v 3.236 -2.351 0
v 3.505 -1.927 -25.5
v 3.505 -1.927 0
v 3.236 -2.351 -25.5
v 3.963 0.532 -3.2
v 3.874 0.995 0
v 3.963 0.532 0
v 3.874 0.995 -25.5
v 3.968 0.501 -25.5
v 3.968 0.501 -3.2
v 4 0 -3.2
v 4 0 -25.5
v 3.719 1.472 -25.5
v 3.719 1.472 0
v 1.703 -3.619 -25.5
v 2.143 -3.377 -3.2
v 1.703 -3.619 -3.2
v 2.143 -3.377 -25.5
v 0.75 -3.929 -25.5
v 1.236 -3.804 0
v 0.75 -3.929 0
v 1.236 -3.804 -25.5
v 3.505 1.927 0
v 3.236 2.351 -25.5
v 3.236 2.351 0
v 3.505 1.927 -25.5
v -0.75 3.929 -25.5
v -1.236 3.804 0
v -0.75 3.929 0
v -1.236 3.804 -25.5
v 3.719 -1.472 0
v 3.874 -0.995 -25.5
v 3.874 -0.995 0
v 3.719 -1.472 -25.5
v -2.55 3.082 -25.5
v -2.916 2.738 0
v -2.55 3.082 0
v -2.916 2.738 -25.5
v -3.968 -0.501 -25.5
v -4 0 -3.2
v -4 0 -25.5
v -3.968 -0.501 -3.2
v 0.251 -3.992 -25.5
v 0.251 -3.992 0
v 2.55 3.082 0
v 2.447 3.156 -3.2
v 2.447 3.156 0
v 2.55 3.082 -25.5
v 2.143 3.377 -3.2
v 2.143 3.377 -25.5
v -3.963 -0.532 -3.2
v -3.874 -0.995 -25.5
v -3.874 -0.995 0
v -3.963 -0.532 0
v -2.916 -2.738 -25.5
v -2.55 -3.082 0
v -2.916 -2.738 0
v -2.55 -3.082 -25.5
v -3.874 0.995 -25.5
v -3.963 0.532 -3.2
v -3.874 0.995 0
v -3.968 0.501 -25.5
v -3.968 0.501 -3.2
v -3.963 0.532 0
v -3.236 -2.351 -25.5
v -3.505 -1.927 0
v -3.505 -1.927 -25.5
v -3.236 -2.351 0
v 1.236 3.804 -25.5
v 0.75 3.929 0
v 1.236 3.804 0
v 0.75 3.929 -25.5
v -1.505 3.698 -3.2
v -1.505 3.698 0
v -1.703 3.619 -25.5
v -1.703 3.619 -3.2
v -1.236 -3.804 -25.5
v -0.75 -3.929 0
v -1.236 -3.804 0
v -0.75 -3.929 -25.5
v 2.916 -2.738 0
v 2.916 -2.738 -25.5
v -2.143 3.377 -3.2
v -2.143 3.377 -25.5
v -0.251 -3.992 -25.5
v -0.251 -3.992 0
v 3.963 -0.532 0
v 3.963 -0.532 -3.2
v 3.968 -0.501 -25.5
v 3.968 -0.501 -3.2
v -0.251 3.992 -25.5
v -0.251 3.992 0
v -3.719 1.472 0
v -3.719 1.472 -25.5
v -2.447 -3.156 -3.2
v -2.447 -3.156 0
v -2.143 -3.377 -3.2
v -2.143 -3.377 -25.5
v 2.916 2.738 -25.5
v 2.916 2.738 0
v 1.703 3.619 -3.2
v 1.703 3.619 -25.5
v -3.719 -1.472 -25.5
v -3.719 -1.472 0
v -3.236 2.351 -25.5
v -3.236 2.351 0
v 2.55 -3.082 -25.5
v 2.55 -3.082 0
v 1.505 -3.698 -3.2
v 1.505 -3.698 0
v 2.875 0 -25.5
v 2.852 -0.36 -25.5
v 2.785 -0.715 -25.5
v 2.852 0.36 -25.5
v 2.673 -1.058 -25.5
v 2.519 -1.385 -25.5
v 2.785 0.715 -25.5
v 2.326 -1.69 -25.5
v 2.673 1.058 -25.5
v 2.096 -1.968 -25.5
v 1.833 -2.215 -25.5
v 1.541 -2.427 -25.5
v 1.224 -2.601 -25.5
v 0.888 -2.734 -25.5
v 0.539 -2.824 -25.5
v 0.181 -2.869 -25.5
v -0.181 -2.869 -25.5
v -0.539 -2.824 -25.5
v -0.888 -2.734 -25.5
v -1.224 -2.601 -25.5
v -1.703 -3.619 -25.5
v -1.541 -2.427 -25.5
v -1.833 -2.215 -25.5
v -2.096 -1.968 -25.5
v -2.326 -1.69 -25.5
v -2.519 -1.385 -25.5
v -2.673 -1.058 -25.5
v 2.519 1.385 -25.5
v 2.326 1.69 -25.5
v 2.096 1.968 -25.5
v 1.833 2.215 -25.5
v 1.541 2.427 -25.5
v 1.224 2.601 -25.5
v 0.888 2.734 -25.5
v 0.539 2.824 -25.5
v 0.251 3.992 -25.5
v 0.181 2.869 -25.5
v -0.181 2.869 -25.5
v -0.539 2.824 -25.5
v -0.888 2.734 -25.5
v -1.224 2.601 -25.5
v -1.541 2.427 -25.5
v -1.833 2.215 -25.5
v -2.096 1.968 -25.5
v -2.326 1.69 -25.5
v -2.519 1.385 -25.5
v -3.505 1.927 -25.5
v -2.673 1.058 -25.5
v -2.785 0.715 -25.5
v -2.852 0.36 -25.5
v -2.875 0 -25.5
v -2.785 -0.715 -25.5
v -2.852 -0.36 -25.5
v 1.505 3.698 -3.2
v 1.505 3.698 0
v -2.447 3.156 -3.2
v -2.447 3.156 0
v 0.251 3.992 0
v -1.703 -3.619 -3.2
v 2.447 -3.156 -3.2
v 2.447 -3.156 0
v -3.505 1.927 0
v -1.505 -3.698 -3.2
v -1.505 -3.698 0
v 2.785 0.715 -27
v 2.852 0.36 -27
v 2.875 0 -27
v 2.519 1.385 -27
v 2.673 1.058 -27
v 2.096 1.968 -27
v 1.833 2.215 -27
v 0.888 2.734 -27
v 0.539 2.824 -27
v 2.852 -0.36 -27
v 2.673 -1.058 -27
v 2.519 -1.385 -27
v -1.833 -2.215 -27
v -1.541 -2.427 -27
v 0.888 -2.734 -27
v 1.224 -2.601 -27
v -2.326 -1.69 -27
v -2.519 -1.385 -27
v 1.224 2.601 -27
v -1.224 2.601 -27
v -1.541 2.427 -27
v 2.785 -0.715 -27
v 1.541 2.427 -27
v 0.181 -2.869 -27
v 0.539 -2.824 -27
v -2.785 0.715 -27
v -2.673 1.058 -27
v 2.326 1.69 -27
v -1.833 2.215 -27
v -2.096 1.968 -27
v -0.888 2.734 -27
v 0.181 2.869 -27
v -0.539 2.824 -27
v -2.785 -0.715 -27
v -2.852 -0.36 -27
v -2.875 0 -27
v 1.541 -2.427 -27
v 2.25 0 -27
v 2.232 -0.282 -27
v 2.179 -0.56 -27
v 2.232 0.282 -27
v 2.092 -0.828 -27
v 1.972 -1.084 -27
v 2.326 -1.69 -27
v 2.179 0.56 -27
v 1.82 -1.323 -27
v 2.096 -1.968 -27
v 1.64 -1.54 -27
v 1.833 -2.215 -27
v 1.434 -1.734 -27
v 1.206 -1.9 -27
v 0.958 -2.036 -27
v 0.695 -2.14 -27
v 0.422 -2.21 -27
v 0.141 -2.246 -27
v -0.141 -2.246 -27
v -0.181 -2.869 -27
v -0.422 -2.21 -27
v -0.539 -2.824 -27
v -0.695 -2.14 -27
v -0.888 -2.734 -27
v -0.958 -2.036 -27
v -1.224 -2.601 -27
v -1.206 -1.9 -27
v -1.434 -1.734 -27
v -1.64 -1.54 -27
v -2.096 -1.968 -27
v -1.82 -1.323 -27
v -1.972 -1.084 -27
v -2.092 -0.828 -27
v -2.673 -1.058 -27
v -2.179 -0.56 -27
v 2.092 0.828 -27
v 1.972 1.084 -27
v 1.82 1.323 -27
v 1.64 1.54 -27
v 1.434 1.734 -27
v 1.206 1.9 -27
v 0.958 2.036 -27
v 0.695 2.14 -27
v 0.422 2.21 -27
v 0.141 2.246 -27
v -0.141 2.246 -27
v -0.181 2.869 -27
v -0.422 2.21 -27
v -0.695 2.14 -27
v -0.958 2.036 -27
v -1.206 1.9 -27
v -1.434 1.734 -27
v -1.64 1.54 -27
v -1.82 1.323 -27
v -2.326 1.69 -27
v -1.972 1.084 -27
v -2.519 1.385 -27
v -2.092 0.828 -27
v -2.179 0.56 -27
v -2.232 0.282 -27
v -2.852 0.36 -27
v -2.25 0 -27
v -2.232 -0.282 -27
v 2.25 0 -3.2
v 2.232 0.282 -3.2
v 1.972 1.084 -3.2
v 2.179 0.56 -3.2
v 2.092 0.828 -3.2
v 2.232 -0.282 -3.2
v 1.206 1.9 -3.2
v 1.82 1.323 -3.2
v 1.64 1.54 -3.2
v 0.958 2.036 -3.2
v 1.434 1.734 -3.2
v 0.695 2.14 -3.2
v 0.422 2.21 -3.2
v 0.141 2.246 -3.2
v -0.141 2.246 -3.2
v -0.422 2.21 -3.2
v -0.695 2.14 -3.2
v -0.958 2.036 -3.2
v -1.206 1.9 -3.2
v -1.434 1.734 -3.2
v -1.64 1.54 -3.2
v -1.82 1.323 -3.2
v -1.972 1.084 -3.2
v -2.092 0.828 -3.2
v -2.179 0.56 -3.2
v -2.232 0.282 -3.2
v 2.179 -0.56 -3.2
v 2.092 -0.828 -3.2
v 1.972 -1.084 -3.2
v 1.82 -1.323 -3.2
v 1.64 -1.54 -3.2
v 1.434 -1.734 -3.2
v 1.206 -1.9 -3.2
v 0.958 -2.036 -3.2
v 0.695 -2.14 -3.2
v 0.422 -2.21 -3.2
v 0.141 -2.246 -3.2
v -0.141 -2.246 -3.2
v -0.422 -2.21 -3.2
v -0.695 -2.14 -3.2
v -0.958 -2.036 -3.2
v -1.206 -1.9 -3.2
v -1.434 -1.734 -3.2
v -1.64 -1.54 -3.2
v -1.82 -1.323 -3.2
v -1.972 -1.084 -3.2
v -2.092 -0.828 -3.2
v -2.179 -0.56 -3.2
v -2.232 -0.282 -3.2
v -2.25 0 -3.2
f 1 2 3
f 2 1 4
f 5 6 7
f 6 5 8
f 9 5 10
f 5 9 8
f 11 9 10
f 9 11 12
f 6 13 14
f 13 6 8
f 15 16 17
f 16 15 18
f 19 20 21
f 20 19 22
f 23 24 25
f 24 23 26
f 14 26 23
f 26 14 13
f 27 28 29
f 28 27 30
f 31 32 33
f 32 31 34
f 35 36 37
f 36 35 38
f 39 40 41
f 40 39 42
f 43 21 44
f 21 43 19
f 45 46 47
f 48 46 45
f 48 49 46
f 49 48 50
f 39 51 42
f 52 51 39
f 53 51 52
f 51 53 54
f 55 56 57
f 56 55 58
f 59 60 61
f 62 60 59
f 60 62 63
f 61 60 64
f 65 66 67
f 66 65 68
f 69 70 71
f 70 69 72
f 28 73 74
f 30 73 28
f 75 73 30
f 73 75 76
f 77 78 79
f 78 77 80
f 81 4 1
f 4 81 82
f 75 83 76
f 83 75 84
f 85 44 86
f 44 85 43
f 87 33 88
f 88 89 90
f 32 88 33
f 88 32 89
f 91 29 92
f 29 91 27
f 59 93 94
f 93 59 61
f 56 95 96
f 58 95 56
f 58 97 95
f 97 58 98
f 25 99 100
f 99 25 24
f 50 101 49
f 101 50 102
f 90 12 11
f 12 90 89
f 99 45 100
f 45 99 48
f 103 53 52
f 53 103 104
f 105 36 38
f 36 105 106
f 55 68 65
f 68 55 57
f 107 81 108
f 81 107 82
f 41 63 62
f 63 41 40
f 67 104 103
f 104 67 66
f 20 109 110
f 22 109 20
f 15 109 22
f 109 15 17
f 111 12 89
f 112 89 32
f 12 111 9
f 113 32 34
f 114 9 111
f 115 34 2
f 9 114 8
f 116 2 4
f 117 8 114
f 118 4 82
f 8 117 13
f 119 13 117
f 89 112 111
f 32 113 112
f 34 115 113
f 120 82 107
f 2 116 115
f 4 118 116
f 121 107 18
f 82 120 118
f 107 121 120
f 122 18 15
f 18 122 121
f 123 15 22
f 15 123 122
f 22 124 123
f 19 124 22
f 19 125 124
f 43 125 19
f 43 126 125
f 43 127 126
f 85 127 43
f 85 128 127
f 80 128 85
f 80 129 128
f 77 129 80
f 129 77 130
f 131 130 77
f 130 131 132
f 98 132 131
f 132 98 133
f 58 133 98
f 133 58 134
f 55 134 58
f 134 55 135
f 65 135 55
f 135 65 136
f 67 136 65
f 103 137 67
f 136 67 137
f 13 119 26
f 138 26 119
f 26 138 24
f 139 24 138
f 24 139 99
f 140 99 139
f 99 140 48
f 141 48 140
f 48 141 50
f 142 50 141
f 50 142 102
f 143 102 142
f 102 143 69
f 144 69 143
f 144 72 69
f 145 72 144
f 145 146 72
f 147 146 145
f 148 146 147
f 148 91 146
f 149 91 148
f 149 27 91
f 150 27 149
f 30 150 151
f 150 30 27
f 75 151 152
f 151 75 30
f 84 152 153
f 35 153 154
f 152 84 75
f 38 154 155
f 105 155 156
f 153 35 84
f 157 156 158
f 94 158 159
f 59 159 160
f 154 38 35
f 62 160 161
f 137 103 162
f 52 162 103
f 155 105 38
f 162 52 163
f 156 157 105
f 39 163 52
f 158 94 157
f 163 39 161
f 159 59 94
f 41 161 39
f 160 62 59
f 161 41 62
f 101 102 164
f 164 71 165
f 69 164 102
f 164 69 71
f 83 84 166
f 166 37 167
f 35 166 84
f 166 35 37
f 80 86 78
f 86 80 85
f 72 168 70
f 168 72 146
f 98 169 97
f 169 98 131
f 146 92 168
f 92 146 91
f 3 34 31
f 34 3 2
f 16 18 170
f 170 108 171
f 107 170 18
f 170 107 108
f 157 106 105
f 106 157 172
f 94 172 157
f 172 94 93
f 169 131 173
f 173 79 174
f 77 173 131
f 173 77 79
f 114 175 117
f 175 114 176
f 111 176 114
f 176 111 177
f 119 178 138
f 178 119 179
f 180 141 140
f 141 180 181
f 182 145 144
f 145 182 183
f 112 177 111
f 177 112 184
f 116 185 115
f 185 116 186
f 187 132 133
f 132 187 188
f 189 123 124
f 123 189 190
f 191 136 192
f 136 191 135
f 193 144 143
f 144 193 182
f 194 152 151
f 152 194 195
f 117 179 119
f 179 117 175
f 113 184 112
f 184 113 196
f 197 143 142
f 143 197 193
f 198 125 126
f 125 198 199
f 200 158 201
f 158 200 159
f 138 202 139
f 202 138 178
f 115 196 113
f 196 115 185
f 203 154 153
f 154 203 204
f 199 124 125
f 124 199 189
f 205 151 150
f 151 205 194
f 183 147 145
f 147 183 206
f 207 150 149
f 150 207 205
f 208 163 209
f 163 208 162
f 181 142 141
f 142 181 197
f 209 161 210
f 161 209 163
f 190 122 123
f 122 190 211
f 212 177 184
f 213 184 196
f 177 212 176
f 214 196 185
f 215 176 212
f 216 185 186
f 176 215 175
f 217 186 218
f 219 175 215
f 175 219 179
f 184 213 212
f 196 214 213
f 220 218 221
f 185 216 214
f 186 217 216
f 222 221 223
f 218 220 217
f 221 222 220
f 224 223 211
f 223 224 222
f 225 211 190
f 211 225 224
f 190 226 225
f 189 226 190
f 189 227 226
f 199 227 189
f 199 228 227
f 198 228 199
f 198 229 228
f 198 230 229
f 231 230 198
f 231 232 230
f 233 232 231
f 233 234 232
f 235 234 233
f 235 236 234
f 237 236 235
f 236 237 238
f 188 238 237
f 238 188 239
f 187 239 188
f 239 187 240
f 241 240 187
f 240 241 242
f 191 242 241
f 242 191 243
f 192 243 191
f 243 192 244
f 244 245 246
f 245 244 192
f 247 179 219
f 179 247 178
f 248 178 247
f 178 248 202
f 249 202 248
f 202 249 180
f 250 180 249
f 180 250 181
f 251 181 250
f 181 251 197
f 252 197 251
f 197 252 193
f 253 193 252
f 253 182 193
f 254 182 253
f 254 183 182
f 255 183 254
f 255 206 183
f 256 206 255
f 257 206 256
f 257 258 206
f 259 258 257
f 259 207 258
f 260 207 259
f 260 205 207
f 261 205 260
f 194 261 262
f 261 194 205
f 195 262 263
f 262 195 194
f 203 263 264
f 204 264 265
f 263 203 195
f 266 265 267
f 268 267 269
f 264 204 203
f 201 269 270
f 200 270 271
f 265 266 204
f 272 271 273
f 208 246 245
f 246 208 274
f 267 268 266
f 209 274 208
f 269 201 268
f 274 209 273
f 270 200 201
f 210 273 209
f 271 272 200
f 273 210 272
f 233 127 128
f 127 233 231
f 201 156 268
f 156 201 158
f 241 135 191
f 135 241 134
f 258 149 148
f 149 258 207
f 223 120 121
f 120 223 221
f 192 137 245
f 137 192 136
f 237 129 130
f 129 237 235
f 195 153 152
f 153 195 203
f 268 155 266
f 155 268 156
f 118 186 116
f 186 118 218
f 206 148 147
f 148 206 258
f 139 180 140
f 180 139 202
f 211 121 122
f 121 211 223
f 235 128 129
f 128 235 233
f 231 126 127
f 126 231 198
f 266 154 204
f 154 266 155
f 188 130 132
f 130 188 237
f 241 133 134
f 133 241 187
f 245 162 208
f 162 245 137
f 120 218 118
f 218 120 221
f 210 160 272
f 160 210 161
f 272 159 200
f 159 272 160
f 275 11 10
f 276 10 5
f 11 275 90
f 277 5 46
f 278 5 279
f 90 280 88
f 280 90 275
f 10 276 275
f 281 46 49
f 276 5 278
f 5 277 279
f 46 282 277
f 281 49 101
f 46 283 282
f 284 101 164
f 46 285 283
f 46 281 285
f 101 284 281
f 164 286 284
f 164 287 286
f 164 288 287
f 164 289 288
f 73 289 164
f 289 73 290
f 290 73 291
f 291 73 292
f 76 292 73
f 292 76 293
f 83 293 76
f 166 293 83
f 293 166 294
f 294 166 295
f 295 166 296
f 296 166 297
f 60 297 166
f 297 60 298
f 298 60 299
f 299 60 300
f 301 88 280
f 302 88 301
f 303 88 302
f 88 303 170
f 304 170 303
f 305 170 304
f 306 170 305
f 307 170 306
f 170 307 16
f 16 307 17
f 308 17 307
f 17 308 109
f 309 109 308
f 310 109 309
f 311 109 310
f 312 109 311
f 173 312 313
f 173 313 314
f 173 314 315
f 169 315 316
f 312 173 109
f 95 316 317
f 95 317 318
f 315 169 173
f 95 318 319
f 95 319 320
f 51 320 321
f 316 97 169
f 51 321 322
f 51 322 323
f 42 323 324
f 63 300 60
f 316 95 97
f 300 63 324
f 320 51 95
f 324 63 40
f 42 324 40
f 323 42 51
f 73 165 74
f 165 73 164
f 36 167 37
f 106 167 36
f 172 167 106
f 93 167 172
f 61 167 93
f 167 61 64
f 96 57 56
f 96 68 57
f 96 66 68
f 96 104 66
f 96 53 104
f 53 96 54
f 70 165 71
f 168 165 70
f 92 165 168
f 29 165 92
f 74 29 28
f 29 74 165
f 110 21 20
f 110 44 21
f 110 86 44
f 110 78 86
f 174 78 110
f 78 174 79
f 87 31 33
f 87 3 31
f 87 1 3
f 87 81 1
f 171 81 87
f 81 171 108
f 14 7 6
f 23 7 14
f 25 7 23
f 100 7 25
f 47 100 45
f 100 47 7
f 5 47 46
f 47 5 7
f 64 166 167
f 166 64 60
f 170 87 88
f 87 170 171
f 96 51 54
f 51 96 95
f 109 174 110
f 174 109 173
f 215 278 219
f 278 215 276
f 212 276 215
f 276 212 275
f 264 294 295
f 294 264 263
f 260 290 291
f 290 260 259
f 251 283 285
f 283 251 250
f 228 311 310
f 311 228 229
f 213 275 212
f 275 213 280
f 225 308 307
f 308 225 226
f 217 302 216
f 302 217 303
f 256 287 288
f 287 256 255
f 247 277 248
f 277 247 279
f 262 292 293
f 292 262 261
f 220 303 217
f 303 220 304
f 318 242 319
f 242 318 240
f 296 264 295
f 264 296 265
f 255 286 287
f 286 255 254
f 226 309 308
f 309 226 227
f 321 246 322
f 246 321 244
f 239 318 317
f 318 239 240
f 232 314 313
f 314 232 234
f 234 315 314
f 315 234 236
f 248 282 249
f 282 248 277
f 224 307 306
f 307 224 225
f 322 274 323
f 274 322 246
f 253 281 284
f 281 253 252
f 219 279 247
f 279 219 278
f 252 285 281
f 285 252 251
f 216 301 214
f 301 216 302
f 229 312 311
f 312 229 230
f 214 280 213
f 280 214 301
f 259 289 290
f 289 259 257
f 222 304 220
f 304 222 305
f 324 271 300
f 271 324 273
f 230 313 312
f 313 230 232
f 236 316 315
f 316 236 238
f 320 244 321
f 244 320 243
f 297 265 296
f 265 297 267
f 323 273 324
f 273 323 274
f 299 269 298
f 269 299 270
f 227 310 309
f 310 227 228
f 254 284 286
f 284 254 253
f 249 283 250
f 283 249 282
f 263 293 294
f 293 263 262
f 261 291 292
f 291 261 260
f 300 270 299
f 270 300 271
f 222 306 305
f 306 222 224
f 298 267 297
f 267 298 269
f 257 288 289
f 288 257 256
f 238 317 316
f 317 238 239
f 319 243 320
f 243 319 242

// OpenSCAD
$fn = 50;

difference() {
	union() {
		translate(v = [0, 0, -25.5]) {
			cylinder(h = 28.5, r = 4.0);
		}
		#translate(v = [0, 0, -27.0]) {
			cylinder(h = 27, r = 2.875);
		}
	}
	union() {
		translate(v = [0, 0, 0]) {
			rotate(a = [0, 0, 0]) {
				difference() {
					union() {
						translate(v = [0, 0, -3.2]) {
							linear_extrude(height = 3.2) {
								polygon(points = [[4.2698, 0.0], [2.1349000000000005, 3.697755269078796], [-2.134899999999999, 3.6977552690787965], [-4.2698, 5.228996902999369e-16], [-2.134900000000002, -3.6977552690787956], [2.1348999999999974, -3.697755269078798]]);
							}
						}
					}
					union();
				}
			}
		}
		#cylinder(h = 3, r = 5.0);
		#translate(v = [0, 0, -100.0]) {
			cylinder(h = 200, r = 2.25);
		}
	}
}
